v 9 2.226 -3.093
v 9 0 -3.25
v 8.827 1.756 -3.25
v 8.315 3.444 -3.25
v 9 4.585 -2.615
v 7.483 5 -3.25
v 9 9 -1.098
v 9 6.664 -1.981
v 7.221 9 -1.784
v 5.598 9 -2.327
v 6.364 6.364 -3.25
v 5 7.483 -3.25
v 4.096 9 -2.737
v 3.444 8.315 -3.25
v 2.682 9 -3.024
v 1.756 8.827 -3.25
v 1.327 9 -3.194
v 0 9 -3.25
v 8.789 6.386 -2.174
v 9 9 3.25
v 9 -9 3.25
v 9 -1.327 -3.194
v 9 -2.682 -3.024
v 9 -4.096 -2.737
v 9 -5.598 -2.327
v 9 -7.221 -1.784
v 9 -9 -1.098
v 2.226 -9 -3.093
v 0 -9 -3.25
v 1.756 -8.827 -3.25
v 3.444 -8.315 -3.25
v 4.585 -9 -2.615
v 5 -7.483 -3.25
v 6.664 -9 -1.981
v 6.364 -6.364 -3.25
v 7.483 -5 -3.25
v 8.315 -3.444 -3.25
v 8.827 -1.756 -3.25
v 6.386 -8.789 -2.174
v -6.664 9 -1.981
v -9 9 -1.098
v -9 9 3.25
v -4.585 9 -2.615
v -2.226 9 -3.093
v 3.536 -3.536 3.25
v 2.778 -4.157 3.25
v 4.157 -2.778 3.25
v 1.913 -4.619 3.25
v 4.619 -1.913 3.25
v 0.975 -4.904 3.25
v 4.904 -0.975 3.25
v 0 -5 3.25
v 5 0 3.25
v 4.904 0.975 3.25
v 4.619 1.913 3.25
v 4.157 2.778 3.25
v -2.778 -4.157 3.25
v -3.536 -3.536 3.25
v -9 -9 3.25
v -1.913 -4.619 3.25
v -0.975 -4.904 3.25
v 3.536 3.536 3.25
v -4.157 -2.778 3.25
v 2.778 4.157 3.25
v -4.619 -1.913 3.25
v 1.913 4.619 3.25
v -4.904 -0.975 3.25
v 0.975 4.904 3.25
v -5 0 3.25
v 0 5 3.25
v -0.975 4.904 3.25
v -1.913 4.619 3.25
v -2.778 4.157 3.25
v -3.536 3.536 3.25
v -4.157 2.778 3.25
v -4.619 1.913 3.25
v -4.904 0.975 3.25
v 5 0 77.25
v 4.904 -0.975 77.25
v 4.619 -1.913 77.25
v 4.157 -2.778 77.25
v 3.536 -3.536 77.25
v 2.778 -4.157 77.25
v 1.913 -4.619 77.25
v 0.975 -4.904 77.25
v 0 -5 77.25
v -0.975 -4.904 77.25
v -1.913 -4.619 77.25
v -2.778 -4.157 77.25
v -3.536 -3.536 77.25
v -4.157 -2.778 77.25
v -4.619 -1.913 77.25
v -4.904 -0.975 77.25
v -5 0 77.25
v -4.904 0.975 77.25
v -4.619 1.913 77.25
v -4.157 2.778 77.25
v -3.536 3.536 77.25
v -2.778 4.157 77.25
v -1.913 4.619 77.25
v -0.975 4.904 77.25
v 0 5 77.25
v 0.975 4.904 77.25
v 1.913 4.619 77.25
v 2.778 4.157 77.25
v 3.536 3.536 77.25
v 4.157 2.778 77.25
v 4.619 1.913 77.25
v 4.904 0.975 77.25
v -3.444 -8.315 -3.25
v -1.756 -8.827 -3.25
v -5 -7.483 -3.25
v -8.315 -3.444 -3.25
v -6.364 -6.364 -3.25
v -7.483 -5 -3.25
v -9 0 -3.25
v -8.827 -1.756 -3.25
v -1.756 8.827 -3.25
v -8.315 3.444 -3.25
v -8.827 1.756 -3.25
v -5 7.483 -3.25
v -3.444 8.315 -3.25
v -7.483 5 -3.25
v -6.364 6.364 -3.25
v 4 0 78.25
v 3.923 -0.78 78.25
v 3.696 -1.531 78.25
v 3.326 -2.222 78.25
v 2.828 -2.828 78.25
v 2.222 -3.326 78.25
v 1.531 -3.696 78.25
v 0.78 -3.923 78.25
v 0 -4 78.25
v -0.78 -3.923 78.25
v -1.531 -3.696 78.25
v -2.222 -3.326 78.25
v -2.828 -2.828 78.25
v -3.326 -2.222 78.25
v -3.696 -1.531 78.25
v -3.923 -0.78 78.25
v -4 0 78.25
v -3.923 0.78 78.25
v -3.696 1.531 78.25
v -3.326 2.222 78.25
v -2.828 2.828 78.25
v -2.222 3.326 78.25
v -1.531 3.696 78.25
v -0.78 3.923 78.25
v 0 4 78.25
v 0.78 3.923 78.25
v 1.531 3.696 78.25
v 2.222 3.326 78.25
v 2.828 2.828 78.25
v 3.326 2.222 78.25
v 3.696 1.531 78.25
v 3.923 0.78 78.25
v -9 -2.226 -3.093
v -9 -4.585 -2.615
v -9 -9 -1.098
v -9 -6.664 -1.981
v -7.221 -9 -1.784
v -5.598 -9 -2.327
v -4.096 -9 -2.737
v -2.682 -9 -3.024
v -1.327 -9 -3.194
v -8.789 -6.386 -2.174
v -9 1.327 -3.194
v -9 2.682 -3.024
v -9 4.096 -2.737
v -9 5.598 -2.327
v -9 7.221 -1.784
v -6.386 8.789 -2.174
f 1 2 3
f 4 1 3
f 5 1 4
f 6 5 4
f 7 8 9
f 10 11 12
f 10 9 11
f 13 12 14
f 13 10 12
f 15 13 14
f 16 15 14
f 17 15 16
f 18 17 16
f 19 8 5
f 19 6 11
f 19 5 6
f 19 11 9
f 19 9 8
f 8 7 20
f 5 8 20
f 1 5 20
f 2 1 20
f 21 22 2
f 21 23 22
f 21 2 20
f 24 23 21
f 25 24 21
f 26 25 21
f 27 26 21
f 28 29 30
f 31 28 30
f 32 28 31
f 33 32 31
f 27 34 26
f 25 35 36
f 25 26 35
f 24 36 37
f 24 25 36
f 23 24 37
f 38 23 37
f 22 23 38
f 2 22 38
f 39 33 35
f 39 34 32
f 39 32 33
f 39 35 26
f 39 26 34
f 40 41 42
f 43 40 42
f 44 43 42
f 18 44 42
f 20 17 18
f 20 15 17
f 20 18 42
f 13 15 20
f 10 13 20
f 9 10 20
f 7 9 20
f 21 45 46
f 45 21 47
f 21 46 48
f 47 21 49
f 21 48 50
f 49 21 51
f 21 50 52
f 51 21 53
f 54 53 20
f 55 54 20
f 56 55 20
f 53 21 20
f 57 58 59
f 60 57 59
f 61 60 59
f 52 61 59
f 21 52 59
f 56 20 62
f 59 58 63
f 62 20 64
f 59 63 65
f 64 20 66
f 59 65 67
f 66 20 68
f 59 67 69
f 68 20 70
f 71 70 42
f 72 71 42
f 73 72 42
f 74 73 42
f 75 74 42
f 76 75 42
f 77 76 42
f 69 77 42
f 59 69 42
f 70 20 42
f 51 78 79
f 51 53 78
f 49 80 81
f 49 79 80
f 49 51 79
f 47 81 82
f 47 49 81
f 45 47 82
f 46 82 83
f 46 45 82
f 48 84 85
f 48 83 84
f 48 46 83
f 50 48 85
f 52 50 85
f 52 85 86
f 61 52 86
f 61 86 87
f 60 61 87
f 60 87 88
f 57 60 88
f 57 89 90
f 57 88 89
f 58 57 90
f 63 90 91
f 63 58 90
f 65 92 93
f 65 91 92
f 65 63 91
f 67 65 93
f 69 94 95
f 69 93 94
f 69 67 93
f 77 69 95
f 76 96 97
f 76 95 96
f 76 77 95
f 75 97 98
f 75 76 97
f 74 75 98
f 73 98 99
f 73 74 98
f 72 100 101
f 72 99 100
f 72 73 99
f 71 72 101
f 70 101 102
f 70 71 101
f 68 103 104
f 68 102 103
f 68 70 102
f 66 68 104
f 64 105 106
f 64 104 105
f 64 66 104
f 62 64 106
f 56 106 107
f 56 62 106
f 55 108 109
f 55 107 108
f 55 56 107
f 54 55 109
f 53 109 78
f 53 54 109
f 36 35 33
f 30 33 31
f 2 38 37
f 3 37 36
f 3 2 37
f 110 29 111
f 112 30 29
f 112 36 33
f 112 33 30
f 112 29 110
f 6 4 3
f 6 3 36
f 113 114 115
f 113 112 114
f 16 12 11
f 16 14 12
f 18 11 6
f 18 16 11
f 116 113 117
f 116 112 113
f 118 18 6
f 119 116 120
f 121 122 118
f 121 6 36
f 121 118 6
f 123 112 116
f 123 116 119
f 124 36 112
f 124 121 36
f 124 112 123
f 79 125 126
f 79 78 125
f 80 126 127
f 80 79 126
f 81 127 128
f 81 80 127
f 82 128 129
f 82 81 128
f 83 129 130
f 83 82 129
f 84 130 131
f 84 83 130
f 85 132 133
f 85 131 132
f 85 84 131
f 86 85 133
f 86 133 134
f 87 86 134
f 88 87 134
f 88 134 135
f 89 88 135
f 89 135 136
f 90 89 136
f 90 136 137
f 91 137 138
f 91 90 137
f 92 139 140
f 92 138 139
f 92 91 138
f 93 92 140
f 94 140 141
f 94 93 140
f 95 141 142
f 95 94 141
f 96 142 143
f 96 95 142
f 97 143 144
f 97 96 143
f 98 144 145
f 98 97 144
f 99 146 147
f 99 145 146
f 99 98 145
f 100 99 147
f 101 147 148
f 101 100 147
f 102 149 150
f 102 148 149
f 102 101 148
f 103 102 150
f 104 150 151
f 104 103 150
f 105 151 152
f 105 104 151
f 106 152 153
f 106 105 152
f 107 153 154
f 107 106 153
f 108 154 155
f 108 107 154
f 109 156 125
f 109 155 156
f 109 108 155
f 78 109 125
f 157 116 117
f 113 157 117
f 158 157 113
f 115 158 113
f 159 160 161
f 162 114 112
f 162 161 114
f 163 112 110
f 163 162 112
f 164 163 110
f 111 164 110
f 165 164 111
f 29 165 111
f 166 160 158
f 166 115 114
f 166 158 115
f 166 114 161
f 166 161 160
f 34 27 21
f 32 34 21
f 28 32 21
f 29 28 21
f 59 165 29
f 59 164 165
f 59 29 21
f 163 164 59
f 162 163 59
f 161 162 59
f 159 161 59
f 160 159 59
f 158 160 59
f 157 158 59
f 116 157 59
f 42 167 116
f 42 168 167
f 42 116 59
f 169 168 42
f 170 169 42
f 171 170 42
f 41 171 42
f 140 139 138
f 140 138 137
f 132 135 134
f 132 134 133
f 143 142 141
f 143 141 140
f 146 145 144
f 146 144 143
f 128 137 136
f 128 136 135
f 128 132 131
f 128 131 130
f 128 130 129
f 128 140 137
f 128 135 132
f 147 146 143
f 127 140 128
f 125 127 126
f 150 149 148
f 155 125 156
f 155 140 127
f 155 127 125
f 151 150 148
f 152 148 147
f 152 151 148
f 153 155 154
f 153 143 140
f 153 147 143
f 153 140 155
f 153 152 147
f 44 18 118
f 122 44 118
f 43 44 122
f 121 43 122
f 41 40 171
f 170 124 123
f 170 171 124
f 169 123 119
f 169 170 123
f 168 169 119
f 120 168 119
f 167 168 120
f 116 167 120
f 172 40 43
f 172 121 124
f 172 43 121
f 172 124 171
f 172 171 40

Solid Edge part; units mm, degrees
sketch "Sketch1" plane through (0, 0, 0) normal (0, 0, 1) x (1, 0, 0)
  line L0 (-9, 9) -> (9, 9)
  line L1 (9, 9) -> (9, -9)
  line L2 (9, -9) -> (-9, -9)
  line L3 (-9, -9) -> (-9, 9)
  dimension "D1" = 18
  dimension "D2" = 18
extrude "Protrusion1" add sketch "Sketch1" along normal mid plane 6.5
sketch "Sketch2" plane through (0, 0, 3.25) normal (0, 0, 1) x (1, 0, 0)
  circle A0 centre (0, 0) radius 5
extrude "ExtrudedProtrusion_2" add sketch "Sketch2" along normal blind 75
chamfer "Chamfer_1" distance 1 angle 45 1 edges at (-5, 0, 78.25)
cosmetic_thread "Thread_1" size "Tr 10 x 2" thread depth 26
sketch "Sketch3" plane through (0, 0, 0) normal (1, 0, 0) x (0, 1, 0)
  line L0 (9, -3.25) -> (38.1568, 13.5837)
revolve "RevolvedCutout1" cut sketch "Sketch3" angle 360 about axis through (0, 0, -57) along (0, 0, 1) material side at (0, 23.6034, 5.1235)
